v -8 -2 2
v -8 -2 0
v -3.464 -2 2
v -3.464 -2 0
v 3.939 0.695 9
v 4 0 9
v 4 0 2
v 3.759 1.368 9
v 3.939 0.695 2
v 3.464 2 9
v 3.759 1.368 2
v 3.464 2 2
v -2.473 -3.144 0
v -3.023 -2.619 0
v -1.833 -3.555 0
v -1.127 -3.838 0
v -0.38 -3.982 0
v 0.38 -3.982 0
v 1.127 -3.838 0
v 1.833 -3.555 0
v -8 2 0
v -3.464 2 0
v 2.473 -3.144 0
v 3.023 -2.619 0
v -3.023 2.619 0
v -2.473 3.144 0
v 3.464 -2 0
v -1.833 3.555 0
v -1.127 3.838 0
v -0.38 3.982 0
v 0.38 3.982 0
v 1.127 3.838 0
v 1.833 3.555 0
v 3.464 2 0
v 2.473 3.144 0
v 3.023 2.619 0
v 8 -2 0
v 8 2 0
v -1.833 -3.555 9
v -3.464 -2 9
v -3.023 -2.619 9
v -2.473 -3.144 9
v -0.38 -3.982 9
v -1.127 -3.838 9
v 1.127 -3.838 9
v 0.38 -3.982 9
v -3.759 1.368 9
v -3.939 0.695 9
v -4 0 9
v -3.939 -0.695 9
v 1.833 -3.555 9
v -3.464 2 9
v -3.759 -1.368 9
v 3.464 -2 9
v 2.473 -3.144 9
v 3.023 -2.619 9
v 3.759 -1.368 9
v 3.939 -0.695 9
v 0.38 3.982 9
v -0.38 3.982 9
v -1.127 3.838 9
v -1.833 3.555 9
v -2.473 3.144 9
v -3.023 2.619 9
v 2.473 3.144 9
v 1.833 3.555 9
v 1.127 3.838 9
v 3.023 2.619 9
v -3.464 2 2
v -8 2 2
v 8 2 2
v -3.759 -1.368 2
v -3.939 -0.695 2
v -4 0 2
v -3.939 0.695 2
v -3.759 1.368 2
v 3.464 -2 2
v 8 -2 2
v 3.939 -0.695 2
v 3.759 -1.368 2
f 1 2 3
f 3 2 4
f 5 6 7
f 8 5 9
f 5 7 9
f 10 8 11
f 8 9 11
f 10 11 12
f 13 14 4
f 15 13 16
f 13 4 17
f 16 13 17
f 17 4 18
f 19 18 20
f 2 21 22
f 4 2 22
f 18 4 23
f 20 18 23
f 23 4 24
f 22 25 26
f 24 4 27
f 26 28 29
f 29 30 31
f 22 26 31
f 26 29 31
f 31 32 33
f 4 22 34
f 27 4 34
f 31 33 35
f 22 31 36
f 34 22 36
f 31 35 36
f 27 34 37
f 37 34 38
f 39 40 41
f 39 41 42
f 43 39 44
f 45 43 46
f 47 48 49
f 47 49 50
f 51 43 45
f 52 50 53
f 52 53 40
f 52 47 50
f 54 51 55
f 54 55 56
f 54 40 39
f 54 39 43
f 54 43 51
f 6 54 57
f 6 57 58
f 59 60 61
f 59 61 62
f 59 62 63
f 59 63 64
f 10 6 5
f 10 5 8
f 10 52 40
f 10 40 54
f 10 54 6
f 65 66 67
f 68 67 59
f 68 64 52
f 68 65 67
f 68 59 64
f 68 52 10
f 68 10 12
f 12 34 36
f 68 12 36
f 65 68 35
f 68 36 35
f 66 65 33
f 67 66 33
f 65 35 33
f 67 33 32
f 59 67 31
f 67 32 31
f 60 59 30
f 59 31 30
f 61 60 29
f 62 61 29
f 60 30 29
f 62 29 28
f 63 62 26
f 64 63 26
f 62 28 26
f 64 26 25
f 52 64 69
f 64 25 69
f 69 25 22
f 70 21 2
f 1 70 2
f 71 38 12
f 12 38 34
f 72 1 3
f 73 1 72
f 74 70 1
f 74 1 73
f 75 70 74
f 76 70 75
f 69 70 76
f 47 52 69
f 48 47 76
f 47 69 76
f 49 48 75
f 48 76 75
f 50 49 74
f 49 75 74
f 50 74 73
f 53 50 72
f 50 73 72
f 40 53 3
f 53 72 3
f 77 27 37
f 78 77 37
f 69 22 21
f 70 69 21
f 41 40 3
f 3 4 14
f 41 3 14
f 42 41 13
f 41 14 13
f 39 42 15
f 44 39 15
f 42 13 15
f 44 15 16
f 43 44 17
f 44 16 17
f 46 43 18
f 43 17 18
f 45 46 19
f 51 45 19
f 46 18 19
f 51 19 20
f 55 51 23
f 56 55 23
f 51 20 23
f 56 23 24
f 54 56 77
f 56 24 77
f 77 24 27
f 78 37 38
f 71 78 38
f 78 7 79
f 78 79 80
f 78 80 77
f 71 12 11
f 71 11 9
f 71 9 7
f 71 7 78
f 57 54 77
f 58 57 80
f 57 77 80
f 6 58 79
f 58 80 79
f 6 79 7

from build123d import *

# Parameters (mm, degrees)
F1_DEPTH = 9
F2_DEPTH = 2


with BuildPart() as f1:
    # F0 (on Top) → F1 (new body)
    with BuildSketch(Plane.XY):
        with BuildLine():
            ThreePointArc((3.4640958416, -2), (3.863698102, -1.0352762805), (3.999995, 0))
            ThreePointArc((3.999995, 0), (3.863698102, 1.0352762805), (3.4640958416, 2))
            Line((3.4640958416, 2), (-3.4640958416, 2))
            ThreePointArc((-3.4640958416, 2), (-3.999995, 0), (-3.4640958416, -2))
            Line((-3.4640958416, -2), (3.4640958416, -2))
        make_face()
        with BuildLine():
            Line((-3.4640958416, 2), (3.4640958416, 2))
            ThreePointArc((3.4640958416, 2), (0, 3.999995), (-3.4640958416, 2))
        make_face()
        with BuildLine():
            ThreePointArc((-3.4640958416, -2), (0, -3.999995), (3.4640958416, -2))
            Line((3.4640958416, -2), (-3.4640958416, -2))
        make_face()
    extrude(amount=F1_DEPTH)

    # F0 (on Top) → F2 (join)
    with BuildSketch(Plane.XY):
        with BuildLine():
            ThreePointArc((3.4640958416, -2), (3.863698102, -1.0352762805), (3.999995, 0))
            ThreePointArc((3.999995, 0), (3.863698102, 1.0352762805), (3.4640958416, 2))
            Line((3.4640958416, 2), (-3.4640958416, 2))
            ThreePointArc((-3.4640958416, 2), (-3.999995, 0), (-3.4640958416, -2))
            Line((-3.4640958416, -2), (3.4640958416, -2))
        make_face()
        with BuildLine():
            ThreePointArc((3.4640958416, 2), (3.863698102, 1.0352762805), (3.999995, 0))
            ThreePointArc((3.999995, 0), (3.863698102, -1.0352762805), (3.4640958416, -2))
            Line((3.4640958416, -2), (8, -2))
            Line((8, -2), (8, 2))
            Line((8, 2), (3.4640958416, 2))
        make_face()
        with BuildLine():
            Line((-3.4640958416, 2), (3.4640958416, 2))
            ThreePointArc((3.4640958416, 2), (0, 3.999995), (-3.4640958416, 2))
        make_face()
        with BuildLine():
            ThreePointArc((-3.4640958416, -2), (0, -3.999995), (3.4640958416, -2))
            Line((3.4640958416, -2), (-3.4640958416, -2))
        make_face()
        with BuildLine():
            ThreePointArc((-3.4640958416, -2), (-3.999995, 0), (-3.4640958416, 2))
            Line((-3.4640958416, 2), (-8, 2))
            Line((-8, 2), (-8, -2))
            Line((-8, -2), (-3.4640958416, -2))
        make_face()
    extrude(amount=F2_DEPTH)


solid = f1.part
